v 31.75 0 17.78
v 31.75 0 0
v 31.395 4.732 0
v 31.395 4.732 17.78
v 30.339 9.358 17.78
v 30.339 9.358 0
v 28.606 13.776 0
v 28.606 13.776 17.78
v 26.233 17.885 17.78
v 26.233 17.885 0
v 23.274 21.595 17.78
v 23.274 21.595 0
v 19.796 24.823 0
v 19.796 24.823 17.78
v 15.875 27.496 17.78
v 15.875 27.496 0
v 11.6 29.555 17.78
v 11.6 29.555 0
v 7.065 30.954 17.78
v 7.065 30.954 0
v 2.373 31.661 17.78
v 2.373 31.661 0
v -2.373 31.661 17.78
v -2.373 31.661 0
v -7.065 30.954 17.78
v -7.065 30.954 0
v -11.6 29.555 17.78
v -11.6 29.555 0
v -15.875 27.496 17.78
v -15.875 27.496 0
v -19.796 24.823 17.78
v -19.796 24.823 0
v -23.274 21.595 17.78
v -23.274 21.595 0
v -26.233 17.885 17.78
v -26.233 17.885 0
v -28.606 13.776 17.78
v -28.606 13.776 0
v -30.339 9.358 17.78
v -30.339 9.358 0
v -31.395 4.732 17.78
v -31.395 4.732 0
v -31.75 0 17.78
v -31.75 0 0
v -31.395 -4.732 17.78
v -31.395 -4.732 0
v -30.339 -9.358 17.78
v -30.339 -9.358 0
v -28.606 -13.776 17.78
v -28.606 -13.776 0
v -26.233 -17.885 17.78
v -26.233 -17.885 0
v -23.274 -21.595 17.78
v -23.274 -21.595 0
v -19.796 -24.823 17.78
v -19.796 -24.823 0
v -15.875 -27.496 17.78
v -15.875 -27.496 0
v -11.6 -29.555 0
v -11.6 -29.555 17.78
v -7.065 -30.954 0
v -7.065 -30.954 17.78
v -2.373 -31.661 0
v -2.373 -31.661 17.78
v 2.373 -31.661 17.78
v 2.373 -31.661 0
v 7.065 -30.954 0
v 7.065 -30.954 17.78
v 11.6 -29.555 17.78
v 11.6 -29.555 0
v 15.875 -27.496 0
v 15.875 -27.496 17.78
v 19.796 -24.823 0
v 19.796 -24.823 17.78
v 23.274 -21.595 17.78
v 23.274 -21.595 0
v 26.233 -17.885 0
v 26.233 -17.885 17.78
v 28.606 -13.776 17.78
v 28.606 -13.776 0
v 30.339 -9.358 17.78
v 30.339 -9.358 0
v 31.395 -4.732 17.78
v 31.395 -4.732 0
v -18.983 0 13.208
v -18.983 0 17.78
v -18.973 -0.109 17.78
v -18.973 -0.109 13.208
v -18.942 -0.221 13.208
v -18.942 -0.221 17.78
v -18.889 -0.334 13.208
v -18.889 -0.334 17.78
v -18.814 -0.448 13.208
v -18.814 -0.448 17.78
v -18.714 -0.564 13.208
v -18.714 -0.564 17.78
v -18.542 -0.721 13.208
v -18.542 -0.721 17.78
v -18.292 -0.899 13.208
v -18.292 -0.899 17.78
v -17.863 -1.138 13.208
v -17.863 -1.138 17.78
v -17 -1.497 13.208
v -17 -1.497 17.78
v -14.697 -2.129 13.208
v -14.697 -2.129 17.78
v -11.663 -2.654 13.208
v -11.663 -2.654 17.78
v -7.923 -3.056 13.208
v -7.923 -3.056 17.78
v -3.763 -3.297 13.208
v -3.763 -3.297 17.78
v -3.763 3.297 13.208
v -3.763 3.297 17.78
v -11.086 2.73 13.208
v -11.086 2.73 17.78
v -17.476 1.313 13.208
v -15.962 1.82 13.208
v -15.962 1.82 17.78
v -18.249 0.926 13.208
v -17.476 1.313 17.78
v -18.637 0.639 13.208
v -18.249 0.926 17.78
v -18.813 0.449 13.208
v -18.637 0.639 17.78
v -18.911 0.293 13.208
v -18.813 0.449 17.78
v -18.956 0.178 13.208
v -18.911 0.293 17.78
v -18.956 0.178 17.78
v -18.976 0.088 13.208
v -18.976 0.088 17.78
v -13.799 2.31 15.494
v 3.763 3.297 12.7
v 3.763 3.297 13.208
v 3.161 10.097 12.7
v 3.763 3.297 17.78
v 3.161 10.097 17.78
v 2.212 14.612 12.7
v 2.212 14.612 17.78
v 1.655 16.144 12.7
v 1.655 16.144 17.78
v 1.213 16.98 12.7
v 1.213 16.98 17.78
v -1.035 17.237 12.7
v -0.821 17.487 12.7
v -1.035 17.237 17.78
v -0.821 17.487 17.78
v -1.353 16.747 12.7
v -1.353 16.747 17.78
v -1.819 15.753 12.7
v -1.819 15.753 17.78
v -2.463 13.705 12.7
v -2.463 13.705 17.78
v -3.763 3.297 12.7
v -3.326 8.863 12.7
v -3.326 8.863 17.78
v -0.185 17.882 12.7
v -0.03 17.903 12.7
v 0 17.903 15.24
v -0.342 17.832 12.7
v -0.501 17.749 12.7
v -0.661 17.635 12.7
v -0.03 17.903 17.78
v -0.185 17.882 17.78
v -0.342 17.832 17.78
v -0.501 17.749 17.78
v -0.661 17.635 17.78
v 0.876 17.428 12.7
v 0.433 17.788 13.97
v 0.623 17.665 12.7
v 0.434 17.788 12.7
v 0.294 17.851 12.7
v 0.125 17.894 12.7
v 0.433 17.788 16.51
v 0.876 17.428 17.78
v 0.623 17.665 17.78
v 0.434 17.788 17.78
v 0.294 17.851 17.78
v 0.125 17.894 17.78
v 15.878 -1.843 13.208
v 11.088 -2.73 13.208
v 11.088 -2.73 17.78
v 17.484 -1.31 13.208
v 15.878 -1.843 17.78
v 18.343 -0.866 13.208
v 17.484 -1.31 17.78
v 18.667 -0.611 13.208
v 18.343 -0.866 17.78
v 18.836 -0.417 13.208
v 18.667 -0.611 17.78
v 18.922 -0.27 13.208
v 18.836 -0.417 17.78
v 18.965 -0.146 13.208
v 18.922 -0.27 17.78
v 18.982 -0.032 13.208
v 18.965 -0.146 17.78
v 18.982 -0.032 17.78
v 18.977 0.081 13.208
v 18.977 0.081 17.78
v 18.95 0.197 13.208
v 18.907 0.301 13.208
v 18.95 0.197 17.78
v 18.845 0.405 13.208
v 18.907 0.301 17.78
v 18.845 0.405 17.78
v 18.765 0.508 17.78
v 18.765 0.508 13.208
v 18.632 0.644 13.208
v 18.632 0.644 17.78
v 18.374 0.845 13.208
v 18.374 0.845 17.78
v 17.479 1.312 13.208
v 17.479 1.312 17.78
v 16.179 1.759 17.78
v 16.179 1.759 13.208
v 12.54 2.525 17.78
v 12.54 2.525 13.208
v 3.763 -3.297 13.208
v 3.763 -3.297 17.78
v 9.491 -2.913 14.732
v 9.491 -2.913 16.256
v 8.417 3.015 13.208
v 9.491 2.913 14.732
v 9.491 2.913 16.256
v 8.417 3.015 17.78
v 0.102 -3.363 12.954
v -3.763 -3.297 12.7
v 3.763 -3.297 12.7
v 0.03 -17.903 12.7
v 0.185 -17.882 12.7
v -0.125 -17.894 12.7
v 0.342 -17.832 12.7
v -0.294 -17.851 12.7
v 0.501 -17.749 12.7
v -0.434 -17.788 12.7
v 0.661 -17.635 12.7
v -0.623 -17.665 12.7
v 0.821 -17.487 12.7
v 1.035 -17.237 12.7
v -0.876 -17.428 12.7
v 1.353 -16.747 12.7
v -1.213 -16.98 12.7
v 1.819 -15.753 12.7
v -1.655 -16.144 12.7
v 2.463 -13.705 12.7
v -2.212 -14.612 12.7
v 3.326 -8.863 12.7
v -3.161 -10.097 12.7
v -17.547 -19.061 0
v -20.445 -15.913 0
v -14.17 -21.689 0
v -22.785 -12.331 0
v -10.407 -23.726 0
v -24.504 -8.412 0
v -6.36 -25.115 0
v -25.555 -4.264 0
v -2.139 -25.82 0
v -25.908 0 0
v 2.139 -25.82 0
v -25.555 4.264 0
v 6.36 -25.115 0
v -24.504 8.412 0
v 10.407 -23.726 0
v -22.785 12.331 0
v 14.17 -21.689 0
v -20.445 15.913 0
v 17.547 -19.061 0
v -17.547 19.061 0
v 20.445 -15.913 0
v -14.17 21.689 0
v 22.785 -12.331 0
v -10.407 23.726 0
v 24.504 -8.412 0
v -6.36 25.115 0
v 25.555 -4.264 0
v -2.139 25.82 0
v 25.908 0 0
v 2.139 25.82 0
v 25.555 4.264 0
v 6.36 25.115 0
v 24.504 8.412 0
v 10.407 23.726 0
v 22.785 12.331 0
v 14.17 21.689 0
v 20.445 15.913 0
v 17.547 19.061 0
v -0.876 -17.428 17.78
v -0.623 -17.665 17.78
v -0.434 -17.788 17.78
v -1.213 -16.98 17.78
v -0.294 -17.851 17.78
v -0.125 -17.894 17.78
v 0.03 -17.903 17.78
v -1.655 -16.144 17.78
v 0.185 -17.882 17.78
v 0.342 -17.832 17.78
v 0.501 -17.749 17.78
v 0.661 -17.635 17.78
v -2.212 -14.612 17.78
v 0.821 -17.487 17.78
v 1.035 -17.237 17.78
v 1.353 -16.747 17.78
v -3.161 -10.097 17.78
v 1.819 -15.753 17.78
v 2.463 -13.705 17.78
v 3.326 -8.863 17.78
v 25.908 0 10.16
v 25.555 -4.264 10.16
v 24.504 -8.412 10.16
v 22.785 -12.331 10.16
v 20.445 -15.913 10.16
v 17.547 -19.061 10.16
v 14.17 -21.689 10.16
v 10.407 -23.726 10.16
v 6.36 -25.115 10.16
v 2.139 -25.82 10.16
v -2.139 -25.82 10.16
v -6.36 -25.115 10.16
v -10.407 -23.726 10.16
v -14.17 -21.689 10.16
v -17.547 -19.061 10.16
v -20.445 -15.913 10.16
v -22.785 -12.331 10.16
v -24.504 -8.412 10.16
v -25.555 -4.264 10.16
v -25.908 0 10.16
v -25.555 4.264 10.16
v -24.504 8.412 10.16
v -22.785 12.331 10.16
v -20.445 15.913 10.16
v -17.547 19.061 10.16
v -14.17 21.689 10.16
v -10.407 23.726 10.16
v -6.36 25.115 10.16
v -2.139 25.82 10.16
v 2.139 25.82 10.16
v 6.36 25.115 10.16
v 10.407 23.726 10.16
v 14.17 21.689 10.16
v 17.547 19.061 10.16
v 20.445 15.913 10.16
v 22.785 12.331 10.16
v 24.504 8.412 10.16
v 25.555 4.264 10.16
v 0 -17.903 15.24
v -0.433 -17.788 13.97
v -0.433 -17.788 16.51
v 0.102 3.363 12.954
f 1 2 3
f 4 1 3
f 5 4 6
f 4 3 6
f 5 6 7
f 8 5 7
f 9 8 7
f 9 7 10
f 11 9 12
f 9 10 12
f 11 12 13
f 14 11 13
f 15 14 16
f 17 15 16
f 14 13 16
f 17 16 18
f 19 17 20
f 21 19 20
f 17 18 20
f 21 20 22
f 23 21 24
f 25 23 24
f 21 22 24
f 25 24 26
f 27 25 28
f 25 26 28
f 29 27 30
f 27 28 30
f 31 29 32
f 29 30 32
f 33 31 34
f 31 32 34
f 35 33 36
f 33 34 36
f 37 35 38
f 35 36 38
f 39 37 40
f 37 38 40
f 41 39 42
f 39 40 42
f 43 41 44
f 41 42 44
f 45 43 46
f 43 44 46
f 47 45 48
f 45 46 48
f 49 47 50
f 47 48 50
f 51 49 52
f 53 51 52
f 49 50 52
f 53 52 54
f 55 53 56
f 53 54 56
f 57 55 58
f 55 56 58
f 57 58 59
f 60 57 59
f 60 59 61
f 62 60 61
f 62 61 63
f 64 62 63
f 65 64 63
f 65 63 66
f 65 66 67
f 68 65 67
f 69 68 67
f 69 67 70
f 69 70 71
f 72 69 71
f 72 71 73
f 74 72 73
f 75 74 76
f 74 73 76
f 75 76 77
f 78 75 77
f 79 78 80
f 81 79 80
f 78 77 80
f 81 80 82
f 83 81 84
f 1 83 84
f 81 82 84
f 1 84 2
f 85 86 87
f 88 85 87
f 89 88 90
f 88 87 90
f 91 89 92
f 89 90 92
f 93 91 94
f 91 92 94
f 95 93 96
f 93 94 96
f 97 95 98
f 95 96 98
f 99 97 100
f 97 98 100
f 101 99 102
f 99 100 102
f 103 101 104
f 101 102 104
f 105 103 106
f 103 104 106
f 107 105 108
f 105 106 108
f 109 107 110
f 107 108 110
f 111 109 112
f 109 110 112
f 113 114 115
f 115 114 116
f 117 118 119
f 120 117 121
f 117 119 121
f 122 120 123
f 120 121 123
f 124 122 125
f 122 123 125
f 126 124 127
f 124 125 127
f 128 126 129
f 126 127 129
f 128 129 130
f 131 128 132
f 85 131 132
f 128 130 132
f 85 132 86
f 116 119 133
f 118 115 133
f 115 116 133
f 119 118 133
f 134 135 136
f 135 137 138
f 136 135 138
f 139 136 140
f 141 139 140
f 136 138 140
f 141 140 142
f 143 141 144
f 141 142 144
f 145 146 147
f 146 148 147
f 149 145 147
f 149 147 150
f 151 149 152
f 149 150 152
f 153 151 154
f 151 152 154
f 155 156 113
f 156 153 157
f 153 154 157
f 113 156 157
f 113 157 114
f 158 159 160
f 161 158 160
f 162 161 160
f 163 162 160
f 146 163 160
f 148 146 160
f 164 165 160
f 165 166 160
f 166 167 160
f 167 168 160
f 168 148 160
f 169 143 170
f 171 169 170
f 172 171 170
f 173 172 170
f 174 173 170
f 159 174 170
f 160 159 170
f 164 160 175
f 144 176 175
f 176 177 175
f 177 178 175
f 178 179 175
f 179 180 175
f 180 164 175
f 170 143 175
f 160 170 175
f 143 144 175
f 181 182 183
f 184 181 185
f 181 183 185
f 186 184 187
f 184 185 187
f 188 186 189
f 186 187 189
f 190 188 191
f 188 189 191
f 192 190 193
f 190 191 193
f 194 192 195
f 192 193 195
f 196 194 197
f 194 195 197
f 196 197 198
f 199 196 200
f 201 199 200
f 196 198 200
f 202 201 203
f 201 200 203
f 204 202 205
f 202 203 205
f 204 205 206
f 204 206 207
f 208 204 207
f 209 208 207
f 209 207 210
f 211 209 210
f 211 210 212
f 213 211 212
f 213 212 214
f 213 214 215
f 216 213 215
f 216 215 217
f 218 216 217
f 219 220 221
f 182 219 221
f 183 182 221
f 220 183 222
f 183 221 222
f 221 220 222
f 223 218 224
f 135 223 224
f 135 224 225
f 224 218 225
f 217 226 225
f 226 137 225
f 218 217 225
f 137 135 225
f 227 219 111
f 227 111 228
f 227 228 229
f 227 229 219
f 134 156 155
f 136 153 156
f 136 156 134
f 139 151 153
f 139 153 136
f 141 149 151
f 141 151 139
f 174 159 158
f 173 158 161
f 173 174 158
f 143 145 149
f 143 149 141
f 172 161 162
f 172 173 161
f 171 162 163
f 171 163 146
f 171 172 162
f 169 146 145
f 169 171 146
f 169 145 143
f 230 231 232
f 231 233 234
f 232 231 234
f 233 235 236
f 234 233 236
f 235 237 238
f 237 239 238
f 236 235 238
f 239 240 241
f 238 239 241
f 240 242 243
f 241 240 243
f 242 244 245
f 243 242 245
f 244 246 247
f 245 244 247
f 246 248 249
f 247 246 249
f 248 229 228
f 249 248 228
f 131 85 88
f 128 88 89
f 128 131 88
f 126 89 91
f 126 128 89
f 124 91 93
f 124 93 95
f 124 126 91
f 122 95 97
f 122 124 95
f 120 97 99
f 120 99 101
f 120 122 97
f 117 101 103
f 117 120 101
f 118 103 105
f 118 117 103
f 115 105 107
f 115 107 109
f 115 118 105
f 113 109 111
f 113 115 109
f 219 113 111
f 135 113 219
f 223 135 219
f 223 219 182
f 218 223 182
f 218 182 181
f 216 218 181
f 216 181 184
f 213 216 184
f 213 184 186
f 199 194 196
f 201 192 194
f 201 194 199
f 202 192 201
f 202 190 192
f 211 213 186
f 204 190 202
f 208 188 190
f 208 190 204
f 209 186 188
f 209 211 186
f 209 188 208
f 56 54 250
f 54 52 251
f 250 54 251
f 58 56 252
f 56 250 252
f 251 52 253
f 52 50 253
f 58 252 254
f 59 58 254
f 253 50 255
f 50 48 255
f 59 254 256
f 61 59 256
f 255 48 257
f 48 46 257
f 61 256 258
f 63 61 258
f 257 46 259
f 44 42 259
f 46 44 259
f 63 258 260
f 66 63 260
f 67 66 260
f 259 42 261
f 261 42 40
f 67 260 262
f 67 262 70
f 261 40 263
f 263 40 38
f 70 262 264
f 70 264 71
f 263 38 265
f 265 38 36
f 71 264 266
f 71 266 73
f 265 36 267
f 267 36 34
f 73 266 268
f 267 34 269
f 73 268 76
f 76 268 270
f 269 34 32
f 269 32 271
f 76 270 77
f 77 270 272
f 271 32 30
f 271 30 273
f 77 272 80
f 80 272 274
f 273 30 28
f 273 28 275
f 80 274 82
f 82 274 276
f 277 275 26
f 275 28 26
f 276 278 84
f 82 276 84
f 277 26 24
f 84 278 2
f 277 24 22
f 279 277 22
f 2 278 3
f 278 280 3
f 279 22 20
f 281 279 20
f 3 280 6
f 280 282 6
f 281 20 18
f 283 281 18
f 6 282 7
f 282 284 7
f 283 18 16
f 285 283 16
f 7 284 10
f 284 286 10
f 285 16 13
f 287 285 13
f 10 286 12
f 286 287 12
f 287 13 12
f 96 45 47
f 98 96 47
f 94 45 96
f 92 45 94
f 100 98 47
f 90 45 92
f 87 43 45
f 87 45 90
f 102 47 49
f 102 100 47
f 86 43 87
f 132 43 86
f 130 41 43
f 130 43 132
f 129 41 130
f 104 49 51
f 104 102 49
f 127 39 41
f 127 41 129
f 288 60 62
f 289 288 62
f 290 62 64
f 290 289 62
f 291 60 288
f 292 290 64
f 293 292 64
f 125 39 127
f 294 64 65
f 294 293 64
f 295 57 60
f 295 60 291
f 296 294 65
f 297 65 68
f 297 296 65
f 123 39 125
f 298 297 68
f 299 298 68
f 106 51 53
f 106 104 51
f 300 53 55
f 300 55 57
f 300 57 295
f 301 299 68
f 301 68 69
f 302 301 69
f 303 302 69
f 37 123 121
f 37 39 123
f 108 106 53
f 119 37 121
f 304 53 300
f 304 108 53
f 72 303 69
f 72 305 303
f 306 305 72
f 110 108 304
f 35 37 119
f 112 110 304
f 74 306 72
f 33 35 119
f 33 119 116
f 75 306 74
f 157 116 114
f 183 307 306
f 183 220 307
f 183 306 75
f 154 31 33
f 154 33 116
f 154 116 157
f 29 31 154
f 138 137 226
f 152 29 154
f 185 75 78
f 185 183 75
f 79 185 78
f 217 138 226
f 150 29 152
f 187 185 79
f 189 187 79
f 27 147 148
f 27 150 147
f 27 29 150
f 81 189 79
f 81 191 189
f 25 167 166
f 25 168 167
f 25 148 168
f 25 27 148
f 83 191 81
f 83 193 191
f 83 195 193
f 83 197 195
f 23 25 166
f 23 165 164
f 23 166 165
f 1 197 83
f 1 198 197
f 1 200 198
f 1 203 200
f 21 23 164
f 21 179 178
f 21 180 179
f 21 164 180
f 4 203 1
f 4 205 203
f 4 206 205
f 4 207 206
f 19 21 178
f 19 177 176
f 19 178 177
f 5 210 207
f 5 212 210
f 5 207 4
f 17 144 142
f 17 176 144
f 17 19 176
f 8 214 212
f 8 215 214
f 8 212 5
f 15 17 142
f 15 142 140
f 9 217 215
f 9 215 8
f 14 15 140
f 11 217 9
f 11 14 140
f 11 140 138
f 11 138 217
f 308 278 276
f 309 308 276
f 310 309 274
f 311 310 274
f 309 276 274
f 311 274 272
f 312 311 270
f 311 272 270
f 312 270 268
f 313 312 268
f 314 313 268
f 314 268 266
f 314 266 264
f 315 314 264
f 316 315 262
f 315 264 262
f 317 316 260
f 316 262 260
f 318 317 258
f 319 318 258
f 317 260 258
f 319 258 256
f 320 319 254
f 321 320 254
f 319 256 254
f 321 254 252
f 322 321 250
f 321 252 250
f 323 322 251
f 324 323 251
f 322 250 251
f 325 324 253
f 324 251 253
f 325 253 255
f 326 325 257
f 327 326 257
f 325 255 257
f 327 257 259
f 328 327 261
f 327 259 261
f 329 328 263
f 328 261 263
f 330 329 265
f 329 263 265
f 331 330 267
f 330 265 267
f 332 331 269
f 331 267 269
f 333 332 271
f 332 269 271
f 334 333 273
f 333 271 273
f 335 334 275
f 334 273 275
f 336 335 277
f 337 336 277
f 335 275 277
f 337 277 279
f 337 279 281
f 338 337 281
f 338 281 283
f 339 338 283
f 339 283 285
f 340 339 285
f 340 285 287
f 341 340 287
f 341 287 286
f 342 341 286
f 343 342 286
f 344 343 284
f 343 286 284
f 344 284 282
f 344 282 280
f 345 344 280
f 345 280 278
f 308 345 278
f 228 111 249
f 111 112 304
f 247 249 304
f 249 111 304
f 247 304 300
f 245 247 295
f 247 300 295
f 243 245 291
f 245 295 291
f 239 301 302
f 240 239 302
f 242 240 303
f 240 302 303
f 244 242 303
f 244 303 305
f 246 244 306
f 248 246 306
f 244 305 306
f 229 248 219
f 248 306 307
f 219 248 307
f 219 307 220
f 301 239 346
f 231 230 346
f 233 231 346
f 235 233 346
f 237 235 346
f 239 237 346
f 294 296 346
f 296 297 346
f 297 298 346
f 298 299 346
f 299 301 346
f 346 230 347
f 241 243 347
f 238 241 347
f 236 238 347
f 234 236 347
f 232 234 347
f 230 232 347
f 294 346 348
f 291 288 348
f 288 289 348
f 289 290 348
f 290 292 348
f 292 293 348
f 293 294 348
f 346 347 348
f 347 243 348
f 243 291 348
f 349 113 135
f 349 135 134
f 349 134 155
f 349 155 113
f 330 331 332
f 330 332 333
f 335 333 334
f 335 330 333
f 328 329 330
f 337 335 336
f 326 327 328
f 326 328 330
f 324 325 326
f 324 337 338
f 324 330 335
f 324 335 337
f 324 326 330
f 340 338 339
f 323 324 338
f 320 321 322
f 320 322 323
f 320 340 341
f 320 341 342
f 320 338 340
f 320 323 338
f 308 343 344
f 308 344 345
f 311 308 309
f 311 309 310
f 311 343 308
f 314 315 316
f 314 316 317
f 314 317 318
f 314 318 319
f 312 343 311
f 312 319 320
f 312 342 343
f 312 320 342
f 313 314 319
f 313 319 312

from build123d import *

# Parameters (mm, degrees)
F0_R     = 31.75
F1_DEPTH = 17.78
F2_R     = 25.908
F3_DEPTH = 10.16
F5_DEPTH = 4.572
F7_DEPTH = 5.08


with BuildPart() as f1:
    # F0 (on Top) → F1 (new body)
    with BuildSketch(Plane.XY):
        Circle(F0_R)
    extrude(amount=F1_DEPTH)

    # F2 (on face) → F3 (cut)
    with BuildSketch(Plane(origin=(0, 0, 0), x_dir=(1, 0, 0), z_dir=(0, 0, -1))):
        Circle(F2_R)
    extrude(amount=-F3_DEPTH, mode=Mode.SUBTRACT)

    # F4 (on face) → F5 (cut)
    with BuildSketch(Plane.XY.offset(17.78)):
        with BuildLine():
            add(Edge.make_bspline(
                [(-18.9828891307, 0), (-18.9828891307, -5.8255543832), (9.4914445654, -2.9127771916), (37.9657782614, 0), (9.4914445654, 2.9127771916), (-18.9828891307, 5.8255543832), (-18.9828891307, 0)],
                knots=[0, 0, 0, 2.0943951024, 2.0943951024, 4.1887902048, 4.1887902048, 6.2831853072, 6.2831853072, 6.2831853072], degree=2, weights=[1, 0.5, 1, 0.5, 1, 0.5, 1]))
        make_face()
    extrude(amount=-F5_DEPTH, mode=Mode.SUBTRACT)

    # F6 (on face) → F7 (cut)
    with BuildSketch(Plane.XY.offset(17.78)):
        with BuildLine():
            add(Edge.make_bspline(
                [(3.7629278729, 3.2966425981), (3.177786528, 17.9034117609), (0, 17.9034117609)],
                knots=[4.8975806012, 4.8975806012, 4.8975806012, 6.2831853072, 6.2831853072, 6.2831853072], degree=2, weights=[1, 0.7694591871, 1]))
            add(Edge.make_bspline(
                [(0, 17.9034117609), (-3.177786528, 17.9034117609), (-3.7629278729, 3.2966425981)],
                knots=[0, 0, 0, 1.385604706, 1.385604706, 1.385604706], degree=2, weights=[1, 0.7694591871, 1]))
            add(Edge.make_bspline(
                [(3.7629278729, 3.2966425981), (0, 3.4314794382), (-3.7629278729, 3.2966425981)],
                knots=[4.5500073421, 4.5500073421, 4.5500073421, 4.9395082154, 4.9395082154, 4.9395082154], degree=2, weights=[0.8572768974, 0.7963648883, 0.770038824]))
        make_face()
        with BuildLine():
            add(Edge.make_bspline(
                [(-3.7629278729, -3.2966425981), (0, -3.4314794382), (3.7629278729, -3.2966425981)],
                knots=[1.3436770918, 1.3436770918, 1.3436770918, 1.7331779651, 1.7331779651, 1.7331779651], degree=2, weights=[0.770038824, 0.7963648883, 0.8572768974]))
            add(Edge.make_bspline(
                [(-3.7629278729, -3.2966425981), (-3.177786528, -17.9034117609), (0, -17.9034117609), (3.177786528, -17.9034117609), (3.7629278729, -3.2966425981)],
                knots=[1.7559879476, 1.7559879476, 1.7559879476, 3.1415926536, 3.1415926536, 4.5271973595, 4.5271973595, 4.5271973595], degree=2, weights=[1, 0.7694591871, 1, 0.7694591871, 1]))
        make_face()
    extrude(amount=-F7_DEPTH, mode=Mode.SUBTRACT)


solid = f1.part
